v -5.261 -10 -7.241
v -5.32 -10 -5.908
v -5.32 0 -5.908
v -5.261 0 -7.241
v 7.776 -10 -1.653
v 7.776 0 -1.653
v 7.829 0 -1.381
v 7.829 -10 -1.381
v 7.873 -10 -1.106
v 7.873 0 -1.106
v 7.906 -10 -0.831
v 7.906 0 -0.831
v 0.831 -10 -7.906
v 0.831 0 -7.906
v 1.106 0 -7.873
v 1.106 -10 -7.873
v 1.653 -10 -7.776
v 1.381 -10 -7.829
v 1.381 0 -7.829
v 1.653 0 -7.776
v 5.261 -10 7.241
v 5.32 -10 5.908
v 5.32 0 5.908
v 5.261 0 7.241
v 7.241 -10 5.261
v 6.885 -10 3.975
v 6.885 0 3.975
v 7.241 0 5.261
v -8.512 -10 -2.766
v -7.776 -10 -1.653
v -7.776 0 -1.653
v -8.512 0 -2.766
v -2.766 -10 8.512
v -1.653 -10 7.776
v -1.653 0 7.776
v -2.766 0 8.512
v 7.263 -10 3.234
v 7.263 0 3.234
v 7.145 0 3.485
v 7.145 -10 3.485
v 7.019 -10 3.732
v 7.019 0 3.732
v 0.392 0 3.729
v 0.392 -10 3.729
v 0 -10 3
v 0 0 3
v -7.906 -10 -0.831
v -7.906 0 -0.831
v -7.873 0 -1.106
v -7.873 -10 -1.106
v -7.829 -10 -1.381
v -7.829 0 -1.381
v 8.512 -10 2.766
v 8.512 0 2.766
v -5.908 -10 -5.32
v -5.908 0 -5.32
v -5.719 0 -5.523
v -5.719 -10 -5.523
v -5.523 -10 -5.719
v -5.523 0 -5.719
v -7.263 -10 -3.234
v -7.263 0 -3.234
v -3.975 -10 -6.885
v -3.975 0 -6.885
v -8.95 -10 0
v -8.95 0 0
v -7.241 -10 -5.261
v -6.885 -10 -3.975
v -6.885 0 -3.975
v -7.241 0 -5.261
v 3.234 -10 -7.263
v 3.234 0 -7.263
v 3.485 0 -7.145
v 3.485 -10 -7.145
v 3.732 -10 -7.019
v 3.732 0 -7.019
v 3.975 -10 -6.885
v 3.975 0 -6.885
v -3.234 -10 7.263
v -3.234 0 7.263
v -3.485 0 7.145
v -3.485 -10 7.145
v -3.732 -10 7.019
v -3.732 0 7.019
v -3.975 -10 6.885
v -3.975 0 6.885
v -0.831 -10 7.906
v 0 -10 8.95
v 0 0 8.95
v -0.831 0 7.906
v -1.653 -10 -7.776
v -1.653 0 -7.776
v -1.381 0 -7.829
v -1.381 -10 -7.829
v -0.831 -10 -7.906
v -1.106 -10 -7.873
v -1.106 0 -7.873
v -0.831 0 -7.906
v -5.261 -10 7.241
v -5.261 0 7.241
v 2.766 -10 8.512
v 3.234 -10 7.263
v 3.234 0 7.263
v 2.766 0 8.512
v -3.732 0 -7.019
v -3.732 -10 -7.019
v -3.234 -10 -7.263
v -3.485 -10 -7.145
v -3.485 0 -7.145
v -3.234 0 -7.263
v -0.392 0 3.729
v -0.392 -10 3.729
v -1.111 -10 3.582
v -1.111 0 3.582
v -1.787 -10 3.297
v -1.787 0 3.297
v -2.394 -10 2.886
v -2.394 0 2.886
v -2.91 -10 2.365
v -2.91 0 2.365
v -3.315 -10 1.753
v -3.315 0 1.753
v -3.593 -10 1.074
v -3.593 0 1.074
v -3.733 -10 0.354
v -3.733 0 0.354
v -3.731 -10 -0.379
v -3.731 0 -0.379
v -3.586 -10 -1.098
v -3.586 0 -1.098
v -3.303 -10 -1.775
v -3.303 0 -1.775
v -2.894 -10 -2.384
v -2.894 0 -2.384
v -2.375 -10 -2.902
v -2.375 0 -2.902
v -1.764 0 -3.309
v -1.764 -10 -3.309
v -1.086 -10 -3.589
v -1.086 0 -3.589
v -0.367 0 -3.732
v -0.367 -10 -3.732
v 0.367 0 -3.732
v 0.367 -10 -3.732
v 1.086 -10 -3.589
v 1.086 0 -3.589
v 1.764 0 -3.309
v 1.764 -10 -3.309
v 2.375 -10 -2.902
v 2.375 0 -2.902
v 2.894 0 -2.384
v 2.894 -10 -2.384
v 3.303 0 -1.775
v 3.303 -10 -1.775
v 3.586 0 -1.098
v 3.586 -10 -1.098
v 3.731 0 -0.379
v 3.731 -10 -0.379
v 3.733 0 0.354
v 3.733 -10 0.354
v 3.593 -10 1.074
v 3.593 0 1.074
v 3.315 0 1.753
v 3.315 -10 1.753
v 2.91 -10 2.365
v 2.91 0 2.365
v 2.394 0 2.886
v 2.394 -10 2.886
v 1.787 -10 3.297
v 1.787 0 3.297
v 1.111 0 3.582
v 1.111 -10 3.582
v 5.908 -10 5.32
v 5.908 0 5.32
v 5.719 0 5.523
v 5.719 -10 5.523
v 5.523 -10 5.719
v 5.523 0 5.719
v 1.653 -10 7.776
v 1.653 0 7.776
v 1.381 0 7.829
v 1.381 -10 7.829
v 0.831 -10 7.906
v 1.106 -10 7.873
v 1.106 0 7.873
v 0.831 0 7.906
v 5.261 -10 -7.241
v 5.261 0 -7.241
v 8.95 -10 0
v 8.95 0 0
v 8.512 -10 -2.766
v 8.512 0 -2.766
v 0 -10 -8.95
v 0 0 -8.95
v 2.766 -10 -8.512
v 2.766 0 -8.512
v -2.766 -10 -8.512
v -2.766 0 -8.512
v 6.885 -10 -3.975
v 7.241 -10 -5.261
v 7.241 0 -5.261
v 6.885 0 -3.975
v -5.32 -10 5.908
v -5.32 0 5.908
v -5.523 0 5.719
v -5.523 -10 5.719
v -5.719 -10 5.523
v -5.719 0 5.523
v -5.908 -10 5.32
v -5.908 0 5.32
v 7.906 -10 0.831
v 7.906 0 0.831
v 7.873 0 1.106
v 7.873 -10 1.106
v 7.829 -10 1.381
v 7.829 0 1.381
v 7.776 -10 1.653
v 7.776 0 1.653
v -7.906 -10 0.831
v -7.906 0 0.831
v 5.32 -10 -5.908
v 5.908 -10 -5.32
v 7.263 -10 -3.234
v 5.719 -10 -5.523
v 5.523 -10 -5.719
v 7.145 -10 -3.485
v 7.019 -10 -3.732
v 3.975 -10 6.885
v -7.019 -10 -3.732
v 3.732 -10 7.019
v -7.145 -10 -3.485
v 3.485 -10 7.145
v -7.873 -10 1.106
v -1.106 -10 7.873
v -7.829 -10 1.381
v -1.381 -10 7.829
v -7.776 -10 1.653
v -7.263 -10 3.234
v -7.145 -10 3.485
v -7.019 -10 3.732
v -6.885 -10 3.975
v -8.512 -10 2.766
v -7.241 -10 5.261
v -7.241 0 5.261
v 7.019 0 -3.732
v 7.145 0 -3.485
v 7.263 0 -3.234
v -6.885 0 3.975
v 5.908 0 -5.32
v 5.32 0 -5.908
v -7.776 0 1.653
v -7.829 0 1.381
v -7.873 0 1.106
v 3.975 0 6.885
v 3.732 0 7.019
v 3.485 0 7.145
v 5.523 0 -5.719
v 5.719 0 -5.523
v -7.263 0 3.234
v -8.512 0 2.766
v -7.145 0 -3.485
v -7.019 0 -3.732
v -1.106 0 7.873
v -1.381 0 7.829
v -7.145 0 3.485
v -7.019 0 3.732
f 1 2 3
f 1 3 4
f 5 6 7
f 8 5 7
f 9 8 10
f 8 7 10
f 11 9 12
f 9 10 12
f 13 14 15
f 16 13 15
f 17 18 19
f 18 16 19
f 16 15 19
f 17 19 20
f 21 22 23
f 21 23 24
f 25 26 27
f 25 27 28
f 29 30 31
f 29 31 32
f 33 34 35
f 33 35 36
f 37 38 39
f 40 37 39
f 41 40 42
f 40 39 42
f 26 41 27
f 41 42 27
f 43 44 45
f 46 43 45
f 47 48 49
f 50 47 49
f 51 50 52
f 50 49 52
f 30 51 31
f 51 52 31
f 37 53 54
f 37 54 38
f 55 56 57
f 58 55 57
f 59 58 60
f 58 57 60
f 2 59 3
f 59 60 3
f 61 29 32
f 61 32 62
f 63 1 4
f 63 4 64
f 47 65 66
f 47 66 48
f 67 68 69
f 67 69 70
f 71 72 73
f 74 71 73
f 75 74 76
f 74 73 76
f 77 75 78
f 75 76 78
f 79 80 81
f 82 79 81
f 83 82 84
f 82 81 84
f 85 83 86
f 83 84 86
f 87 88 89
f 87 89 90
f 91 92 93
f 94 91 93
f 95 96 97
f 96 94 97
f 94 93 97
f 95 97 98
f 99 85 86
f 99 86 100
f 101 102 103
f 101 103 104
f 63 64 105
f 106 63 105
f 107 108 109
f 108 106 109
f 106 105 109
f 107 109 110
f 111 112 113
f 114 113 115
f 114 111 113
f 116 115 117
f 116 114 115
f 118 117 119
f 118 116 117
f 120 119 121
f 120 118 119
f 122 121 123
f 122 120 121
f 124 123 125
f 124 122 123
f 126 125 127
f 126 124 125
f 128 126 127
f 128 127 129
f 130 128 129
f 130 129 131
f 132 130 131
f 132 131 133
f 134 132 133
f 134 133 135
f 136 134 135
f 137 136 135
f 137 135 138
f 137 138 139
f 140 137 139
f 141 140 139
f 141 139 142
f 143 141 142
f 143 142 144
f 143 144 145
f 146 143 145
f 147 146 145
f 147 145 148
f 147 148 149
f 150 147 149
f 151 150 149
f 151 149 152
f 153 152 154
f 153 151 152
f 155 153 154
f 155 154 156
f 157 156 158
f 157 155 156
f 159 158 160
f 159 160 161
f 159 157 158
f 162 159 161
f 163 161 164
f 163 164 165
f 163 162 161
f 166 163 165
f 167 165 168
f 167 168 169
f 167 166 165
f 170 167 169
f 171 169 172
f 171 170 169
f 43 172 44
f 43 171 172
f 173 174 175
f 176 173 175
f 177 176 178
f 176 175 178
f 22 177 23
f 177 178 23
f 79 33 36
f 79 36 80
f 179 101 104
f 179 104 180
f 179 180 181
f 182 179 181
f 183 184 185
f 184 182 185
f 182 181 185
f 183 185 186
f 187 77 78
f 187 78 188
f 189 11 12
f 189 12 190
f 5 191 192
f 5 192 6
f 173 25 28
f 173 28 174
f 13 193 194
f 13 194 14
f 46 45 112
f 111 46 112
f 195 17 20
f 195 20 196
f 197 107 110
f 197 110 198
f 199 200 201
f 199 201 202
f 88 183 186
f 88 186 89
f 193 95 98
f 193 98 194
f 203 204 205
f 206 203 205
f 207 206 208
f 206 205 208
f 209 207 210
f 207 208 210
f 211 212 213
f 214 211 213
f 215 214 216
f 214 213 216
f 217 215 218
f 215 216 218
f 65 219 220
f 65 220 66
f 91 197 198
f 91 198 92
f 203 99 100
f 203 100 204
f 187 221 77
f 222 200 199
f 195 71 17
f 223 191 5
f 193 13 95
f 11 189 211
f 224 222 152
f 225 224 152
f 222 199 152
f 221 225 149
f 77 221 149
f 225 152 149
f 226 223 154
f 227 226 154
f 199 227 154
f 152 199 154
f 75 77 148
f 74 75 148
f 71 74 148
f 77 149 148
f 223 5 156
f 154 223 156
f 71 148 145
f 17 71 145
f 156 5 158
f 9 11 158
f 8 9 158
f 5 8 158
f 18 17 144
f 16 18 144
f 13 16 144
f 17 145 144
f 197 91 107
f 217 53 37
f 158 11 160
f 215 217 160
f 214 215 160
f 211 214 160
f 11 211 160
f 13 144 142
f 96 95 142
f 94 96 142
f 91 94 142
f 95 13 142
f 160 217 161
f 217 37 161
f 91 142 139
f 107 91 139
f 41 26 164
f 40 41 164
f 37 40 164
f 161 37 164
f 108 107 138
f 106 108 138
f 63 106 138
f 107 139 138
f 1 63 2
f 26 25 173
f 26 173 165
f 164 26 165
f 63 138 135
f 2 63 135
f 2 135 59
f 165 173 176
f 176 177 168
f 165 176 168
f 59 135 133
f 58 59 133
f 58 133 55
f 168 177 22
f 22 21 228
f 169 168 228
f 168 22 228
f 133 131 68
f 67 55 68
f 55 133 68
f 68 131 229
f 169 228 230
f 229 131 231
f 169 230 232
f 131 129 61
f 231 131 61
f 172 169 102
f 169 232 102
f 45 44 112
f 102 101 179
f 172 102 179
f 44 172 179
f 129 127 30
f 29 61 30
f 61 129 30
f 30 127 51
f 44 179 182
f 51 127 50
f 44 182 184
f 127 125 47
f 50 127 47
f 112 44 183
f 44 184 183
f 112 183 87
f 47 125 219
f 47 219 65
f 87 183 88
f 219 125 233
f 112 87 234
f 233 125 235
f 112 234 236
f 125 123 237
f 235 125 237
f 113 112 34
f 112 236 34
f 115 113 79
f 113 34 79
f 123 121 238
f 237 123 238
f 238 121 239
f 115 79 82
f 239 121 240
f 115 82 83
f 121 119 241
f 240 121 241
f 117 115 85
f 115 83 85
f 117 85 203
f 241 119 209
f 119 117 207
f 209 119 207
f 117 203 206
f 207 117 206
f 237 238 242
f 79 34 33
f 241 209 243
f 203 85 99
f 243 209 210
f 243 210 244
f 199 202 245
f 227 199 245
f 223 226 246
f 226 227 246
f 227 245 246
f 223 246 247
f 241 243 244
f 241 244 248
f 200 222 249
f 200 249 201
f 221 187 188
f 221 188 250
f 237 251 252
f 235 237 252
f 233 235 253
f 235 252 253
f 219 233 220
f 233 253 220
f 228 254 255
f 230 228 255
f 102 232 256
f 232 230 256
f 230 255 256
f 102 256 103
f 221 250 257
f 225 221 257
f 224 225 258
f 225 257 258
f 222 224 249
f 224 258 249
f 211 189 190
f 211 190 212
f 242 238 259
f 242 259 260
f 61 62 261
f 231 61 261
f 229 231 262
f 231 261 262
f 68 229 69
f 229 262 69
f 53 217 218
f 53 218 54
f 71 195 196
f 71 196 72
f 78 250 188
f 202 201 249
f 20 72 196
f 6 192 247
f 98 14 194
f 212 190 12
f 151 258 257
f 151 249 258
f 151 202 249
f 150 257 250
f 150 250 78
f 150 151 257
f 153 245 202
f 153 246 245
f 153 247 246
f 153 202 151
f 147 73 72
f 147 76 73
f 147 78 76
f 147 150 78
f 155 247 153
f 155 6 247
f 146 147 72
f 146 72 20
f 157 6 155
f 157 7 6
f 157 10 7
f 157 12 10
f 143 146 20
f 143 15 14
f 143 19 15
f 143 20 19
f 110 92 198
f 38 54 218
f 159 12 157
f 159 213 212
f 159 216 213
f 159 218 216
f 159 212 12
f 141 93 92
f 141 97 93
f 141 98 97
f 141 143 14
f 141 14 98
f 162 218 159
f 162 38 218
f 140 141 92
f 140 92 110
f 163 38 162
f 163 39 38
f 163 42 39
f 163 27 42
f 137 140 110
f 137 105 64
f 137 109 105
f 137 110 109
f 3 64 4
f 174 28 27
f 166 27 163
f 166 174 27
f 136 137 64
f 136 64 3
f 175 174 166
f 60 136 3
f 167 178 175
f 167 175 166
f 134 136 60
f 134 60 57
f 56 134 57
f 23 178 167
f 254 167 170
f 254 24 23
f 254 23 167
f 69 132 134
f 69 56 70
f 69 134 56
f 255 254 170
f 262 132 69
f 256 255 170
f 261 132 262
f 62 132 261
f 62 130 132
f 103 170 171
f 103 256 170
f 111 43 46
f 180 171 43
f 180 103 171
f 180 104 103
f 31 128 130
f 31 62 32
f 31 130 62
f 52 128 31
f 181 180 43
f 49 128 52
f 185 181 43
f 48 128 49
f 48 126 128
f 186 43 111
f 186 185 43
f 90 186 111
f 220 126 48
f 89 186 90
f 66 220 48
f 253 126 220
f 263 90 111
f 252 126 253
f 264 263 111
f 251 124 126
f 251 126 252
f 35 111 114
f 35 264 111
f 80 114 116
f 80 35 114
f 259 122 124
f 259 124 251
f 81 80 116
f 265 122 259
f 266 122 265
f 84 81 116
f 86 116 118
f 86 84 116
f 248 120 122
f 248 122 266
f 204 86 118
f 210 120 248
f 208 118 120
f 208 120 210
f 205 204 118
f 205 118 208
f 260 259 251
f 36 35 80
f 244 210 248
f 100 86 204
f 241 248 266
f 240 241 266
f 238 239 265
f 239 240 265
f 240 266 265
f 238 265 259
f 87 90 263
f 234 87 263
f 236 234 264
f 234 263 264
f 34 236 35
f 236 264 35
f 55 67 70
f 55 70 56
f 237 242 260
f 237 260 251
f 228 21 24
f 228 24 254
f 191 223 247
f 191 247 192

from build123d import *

# Parameters (mm, degrees)
F0_R     = 7.95
F0_R_2   = 3.75
F1_DEPTH = 10
F3_DEPTH = 10
F4_COUNT = 20
F6_DEPTH = 10


with BuildPart() as f1:
    # F0 (on Front) → F1 (new body)
    with BuildSketch(Plane.XZ):
        Circle(F0_R)
        Circle(F0_R_2, mode=Mode.SUBTRACT)
    extrude(amount=F1_DEPTH)

    # F2 (on face) → F3 (join, through all)
    with BuildSketch(Plane.XZ.offset(10)):
        with BuildLine():
            ThreePointArc((-0.831001, 7.906449), (0, 7.95), (0.831001, 7.906449))
            Line((0.831001, 7.906449), (0, 8.95))
            Line((0, 8.95), (-0.831001, 7.906449))
        make_face()
    extrude(amount=-F3_DEPTH)

    # F4: F1 ×20 about axis
    f4_axis = Axis((0, 0, 0), (0, 1, 0))


with BuildPart() as f1_1:
    add(f1.part)
    for i in range(1, F4_COUNT):
        add(f1.part.rotate(f4_axis, i * 360 / F4_COUNT))

    # F5 (on face) → F6 (join, through all)
    with BuildSketch(Plane(origin=(0, 0, 0), x_dir=(-1, 0, 0), z_dir=(0, 1, 0))):
        with BuildLine():
            Line((-0.391982, 3.729457), (0, 3))
            Line((0, 3), (0.391982, 3.729457))
            ThreePointArc((0.391982, 3.729457), (0, 3.75), (-0.391982, 3.729457))
        make_face()
        with BuildLine():
            Line((0, 4.064701), (-0.391982, 3.729457))
            ThreePointArc((-0.391982, 3.729457), (0, 3.75), (0.391982, 3.729457))
            Line((0.391982, 3.729457), (0, 4.064701))
        make_face()
    extrude(amount=-F6_DEPTH)


solid = f1_1.part
